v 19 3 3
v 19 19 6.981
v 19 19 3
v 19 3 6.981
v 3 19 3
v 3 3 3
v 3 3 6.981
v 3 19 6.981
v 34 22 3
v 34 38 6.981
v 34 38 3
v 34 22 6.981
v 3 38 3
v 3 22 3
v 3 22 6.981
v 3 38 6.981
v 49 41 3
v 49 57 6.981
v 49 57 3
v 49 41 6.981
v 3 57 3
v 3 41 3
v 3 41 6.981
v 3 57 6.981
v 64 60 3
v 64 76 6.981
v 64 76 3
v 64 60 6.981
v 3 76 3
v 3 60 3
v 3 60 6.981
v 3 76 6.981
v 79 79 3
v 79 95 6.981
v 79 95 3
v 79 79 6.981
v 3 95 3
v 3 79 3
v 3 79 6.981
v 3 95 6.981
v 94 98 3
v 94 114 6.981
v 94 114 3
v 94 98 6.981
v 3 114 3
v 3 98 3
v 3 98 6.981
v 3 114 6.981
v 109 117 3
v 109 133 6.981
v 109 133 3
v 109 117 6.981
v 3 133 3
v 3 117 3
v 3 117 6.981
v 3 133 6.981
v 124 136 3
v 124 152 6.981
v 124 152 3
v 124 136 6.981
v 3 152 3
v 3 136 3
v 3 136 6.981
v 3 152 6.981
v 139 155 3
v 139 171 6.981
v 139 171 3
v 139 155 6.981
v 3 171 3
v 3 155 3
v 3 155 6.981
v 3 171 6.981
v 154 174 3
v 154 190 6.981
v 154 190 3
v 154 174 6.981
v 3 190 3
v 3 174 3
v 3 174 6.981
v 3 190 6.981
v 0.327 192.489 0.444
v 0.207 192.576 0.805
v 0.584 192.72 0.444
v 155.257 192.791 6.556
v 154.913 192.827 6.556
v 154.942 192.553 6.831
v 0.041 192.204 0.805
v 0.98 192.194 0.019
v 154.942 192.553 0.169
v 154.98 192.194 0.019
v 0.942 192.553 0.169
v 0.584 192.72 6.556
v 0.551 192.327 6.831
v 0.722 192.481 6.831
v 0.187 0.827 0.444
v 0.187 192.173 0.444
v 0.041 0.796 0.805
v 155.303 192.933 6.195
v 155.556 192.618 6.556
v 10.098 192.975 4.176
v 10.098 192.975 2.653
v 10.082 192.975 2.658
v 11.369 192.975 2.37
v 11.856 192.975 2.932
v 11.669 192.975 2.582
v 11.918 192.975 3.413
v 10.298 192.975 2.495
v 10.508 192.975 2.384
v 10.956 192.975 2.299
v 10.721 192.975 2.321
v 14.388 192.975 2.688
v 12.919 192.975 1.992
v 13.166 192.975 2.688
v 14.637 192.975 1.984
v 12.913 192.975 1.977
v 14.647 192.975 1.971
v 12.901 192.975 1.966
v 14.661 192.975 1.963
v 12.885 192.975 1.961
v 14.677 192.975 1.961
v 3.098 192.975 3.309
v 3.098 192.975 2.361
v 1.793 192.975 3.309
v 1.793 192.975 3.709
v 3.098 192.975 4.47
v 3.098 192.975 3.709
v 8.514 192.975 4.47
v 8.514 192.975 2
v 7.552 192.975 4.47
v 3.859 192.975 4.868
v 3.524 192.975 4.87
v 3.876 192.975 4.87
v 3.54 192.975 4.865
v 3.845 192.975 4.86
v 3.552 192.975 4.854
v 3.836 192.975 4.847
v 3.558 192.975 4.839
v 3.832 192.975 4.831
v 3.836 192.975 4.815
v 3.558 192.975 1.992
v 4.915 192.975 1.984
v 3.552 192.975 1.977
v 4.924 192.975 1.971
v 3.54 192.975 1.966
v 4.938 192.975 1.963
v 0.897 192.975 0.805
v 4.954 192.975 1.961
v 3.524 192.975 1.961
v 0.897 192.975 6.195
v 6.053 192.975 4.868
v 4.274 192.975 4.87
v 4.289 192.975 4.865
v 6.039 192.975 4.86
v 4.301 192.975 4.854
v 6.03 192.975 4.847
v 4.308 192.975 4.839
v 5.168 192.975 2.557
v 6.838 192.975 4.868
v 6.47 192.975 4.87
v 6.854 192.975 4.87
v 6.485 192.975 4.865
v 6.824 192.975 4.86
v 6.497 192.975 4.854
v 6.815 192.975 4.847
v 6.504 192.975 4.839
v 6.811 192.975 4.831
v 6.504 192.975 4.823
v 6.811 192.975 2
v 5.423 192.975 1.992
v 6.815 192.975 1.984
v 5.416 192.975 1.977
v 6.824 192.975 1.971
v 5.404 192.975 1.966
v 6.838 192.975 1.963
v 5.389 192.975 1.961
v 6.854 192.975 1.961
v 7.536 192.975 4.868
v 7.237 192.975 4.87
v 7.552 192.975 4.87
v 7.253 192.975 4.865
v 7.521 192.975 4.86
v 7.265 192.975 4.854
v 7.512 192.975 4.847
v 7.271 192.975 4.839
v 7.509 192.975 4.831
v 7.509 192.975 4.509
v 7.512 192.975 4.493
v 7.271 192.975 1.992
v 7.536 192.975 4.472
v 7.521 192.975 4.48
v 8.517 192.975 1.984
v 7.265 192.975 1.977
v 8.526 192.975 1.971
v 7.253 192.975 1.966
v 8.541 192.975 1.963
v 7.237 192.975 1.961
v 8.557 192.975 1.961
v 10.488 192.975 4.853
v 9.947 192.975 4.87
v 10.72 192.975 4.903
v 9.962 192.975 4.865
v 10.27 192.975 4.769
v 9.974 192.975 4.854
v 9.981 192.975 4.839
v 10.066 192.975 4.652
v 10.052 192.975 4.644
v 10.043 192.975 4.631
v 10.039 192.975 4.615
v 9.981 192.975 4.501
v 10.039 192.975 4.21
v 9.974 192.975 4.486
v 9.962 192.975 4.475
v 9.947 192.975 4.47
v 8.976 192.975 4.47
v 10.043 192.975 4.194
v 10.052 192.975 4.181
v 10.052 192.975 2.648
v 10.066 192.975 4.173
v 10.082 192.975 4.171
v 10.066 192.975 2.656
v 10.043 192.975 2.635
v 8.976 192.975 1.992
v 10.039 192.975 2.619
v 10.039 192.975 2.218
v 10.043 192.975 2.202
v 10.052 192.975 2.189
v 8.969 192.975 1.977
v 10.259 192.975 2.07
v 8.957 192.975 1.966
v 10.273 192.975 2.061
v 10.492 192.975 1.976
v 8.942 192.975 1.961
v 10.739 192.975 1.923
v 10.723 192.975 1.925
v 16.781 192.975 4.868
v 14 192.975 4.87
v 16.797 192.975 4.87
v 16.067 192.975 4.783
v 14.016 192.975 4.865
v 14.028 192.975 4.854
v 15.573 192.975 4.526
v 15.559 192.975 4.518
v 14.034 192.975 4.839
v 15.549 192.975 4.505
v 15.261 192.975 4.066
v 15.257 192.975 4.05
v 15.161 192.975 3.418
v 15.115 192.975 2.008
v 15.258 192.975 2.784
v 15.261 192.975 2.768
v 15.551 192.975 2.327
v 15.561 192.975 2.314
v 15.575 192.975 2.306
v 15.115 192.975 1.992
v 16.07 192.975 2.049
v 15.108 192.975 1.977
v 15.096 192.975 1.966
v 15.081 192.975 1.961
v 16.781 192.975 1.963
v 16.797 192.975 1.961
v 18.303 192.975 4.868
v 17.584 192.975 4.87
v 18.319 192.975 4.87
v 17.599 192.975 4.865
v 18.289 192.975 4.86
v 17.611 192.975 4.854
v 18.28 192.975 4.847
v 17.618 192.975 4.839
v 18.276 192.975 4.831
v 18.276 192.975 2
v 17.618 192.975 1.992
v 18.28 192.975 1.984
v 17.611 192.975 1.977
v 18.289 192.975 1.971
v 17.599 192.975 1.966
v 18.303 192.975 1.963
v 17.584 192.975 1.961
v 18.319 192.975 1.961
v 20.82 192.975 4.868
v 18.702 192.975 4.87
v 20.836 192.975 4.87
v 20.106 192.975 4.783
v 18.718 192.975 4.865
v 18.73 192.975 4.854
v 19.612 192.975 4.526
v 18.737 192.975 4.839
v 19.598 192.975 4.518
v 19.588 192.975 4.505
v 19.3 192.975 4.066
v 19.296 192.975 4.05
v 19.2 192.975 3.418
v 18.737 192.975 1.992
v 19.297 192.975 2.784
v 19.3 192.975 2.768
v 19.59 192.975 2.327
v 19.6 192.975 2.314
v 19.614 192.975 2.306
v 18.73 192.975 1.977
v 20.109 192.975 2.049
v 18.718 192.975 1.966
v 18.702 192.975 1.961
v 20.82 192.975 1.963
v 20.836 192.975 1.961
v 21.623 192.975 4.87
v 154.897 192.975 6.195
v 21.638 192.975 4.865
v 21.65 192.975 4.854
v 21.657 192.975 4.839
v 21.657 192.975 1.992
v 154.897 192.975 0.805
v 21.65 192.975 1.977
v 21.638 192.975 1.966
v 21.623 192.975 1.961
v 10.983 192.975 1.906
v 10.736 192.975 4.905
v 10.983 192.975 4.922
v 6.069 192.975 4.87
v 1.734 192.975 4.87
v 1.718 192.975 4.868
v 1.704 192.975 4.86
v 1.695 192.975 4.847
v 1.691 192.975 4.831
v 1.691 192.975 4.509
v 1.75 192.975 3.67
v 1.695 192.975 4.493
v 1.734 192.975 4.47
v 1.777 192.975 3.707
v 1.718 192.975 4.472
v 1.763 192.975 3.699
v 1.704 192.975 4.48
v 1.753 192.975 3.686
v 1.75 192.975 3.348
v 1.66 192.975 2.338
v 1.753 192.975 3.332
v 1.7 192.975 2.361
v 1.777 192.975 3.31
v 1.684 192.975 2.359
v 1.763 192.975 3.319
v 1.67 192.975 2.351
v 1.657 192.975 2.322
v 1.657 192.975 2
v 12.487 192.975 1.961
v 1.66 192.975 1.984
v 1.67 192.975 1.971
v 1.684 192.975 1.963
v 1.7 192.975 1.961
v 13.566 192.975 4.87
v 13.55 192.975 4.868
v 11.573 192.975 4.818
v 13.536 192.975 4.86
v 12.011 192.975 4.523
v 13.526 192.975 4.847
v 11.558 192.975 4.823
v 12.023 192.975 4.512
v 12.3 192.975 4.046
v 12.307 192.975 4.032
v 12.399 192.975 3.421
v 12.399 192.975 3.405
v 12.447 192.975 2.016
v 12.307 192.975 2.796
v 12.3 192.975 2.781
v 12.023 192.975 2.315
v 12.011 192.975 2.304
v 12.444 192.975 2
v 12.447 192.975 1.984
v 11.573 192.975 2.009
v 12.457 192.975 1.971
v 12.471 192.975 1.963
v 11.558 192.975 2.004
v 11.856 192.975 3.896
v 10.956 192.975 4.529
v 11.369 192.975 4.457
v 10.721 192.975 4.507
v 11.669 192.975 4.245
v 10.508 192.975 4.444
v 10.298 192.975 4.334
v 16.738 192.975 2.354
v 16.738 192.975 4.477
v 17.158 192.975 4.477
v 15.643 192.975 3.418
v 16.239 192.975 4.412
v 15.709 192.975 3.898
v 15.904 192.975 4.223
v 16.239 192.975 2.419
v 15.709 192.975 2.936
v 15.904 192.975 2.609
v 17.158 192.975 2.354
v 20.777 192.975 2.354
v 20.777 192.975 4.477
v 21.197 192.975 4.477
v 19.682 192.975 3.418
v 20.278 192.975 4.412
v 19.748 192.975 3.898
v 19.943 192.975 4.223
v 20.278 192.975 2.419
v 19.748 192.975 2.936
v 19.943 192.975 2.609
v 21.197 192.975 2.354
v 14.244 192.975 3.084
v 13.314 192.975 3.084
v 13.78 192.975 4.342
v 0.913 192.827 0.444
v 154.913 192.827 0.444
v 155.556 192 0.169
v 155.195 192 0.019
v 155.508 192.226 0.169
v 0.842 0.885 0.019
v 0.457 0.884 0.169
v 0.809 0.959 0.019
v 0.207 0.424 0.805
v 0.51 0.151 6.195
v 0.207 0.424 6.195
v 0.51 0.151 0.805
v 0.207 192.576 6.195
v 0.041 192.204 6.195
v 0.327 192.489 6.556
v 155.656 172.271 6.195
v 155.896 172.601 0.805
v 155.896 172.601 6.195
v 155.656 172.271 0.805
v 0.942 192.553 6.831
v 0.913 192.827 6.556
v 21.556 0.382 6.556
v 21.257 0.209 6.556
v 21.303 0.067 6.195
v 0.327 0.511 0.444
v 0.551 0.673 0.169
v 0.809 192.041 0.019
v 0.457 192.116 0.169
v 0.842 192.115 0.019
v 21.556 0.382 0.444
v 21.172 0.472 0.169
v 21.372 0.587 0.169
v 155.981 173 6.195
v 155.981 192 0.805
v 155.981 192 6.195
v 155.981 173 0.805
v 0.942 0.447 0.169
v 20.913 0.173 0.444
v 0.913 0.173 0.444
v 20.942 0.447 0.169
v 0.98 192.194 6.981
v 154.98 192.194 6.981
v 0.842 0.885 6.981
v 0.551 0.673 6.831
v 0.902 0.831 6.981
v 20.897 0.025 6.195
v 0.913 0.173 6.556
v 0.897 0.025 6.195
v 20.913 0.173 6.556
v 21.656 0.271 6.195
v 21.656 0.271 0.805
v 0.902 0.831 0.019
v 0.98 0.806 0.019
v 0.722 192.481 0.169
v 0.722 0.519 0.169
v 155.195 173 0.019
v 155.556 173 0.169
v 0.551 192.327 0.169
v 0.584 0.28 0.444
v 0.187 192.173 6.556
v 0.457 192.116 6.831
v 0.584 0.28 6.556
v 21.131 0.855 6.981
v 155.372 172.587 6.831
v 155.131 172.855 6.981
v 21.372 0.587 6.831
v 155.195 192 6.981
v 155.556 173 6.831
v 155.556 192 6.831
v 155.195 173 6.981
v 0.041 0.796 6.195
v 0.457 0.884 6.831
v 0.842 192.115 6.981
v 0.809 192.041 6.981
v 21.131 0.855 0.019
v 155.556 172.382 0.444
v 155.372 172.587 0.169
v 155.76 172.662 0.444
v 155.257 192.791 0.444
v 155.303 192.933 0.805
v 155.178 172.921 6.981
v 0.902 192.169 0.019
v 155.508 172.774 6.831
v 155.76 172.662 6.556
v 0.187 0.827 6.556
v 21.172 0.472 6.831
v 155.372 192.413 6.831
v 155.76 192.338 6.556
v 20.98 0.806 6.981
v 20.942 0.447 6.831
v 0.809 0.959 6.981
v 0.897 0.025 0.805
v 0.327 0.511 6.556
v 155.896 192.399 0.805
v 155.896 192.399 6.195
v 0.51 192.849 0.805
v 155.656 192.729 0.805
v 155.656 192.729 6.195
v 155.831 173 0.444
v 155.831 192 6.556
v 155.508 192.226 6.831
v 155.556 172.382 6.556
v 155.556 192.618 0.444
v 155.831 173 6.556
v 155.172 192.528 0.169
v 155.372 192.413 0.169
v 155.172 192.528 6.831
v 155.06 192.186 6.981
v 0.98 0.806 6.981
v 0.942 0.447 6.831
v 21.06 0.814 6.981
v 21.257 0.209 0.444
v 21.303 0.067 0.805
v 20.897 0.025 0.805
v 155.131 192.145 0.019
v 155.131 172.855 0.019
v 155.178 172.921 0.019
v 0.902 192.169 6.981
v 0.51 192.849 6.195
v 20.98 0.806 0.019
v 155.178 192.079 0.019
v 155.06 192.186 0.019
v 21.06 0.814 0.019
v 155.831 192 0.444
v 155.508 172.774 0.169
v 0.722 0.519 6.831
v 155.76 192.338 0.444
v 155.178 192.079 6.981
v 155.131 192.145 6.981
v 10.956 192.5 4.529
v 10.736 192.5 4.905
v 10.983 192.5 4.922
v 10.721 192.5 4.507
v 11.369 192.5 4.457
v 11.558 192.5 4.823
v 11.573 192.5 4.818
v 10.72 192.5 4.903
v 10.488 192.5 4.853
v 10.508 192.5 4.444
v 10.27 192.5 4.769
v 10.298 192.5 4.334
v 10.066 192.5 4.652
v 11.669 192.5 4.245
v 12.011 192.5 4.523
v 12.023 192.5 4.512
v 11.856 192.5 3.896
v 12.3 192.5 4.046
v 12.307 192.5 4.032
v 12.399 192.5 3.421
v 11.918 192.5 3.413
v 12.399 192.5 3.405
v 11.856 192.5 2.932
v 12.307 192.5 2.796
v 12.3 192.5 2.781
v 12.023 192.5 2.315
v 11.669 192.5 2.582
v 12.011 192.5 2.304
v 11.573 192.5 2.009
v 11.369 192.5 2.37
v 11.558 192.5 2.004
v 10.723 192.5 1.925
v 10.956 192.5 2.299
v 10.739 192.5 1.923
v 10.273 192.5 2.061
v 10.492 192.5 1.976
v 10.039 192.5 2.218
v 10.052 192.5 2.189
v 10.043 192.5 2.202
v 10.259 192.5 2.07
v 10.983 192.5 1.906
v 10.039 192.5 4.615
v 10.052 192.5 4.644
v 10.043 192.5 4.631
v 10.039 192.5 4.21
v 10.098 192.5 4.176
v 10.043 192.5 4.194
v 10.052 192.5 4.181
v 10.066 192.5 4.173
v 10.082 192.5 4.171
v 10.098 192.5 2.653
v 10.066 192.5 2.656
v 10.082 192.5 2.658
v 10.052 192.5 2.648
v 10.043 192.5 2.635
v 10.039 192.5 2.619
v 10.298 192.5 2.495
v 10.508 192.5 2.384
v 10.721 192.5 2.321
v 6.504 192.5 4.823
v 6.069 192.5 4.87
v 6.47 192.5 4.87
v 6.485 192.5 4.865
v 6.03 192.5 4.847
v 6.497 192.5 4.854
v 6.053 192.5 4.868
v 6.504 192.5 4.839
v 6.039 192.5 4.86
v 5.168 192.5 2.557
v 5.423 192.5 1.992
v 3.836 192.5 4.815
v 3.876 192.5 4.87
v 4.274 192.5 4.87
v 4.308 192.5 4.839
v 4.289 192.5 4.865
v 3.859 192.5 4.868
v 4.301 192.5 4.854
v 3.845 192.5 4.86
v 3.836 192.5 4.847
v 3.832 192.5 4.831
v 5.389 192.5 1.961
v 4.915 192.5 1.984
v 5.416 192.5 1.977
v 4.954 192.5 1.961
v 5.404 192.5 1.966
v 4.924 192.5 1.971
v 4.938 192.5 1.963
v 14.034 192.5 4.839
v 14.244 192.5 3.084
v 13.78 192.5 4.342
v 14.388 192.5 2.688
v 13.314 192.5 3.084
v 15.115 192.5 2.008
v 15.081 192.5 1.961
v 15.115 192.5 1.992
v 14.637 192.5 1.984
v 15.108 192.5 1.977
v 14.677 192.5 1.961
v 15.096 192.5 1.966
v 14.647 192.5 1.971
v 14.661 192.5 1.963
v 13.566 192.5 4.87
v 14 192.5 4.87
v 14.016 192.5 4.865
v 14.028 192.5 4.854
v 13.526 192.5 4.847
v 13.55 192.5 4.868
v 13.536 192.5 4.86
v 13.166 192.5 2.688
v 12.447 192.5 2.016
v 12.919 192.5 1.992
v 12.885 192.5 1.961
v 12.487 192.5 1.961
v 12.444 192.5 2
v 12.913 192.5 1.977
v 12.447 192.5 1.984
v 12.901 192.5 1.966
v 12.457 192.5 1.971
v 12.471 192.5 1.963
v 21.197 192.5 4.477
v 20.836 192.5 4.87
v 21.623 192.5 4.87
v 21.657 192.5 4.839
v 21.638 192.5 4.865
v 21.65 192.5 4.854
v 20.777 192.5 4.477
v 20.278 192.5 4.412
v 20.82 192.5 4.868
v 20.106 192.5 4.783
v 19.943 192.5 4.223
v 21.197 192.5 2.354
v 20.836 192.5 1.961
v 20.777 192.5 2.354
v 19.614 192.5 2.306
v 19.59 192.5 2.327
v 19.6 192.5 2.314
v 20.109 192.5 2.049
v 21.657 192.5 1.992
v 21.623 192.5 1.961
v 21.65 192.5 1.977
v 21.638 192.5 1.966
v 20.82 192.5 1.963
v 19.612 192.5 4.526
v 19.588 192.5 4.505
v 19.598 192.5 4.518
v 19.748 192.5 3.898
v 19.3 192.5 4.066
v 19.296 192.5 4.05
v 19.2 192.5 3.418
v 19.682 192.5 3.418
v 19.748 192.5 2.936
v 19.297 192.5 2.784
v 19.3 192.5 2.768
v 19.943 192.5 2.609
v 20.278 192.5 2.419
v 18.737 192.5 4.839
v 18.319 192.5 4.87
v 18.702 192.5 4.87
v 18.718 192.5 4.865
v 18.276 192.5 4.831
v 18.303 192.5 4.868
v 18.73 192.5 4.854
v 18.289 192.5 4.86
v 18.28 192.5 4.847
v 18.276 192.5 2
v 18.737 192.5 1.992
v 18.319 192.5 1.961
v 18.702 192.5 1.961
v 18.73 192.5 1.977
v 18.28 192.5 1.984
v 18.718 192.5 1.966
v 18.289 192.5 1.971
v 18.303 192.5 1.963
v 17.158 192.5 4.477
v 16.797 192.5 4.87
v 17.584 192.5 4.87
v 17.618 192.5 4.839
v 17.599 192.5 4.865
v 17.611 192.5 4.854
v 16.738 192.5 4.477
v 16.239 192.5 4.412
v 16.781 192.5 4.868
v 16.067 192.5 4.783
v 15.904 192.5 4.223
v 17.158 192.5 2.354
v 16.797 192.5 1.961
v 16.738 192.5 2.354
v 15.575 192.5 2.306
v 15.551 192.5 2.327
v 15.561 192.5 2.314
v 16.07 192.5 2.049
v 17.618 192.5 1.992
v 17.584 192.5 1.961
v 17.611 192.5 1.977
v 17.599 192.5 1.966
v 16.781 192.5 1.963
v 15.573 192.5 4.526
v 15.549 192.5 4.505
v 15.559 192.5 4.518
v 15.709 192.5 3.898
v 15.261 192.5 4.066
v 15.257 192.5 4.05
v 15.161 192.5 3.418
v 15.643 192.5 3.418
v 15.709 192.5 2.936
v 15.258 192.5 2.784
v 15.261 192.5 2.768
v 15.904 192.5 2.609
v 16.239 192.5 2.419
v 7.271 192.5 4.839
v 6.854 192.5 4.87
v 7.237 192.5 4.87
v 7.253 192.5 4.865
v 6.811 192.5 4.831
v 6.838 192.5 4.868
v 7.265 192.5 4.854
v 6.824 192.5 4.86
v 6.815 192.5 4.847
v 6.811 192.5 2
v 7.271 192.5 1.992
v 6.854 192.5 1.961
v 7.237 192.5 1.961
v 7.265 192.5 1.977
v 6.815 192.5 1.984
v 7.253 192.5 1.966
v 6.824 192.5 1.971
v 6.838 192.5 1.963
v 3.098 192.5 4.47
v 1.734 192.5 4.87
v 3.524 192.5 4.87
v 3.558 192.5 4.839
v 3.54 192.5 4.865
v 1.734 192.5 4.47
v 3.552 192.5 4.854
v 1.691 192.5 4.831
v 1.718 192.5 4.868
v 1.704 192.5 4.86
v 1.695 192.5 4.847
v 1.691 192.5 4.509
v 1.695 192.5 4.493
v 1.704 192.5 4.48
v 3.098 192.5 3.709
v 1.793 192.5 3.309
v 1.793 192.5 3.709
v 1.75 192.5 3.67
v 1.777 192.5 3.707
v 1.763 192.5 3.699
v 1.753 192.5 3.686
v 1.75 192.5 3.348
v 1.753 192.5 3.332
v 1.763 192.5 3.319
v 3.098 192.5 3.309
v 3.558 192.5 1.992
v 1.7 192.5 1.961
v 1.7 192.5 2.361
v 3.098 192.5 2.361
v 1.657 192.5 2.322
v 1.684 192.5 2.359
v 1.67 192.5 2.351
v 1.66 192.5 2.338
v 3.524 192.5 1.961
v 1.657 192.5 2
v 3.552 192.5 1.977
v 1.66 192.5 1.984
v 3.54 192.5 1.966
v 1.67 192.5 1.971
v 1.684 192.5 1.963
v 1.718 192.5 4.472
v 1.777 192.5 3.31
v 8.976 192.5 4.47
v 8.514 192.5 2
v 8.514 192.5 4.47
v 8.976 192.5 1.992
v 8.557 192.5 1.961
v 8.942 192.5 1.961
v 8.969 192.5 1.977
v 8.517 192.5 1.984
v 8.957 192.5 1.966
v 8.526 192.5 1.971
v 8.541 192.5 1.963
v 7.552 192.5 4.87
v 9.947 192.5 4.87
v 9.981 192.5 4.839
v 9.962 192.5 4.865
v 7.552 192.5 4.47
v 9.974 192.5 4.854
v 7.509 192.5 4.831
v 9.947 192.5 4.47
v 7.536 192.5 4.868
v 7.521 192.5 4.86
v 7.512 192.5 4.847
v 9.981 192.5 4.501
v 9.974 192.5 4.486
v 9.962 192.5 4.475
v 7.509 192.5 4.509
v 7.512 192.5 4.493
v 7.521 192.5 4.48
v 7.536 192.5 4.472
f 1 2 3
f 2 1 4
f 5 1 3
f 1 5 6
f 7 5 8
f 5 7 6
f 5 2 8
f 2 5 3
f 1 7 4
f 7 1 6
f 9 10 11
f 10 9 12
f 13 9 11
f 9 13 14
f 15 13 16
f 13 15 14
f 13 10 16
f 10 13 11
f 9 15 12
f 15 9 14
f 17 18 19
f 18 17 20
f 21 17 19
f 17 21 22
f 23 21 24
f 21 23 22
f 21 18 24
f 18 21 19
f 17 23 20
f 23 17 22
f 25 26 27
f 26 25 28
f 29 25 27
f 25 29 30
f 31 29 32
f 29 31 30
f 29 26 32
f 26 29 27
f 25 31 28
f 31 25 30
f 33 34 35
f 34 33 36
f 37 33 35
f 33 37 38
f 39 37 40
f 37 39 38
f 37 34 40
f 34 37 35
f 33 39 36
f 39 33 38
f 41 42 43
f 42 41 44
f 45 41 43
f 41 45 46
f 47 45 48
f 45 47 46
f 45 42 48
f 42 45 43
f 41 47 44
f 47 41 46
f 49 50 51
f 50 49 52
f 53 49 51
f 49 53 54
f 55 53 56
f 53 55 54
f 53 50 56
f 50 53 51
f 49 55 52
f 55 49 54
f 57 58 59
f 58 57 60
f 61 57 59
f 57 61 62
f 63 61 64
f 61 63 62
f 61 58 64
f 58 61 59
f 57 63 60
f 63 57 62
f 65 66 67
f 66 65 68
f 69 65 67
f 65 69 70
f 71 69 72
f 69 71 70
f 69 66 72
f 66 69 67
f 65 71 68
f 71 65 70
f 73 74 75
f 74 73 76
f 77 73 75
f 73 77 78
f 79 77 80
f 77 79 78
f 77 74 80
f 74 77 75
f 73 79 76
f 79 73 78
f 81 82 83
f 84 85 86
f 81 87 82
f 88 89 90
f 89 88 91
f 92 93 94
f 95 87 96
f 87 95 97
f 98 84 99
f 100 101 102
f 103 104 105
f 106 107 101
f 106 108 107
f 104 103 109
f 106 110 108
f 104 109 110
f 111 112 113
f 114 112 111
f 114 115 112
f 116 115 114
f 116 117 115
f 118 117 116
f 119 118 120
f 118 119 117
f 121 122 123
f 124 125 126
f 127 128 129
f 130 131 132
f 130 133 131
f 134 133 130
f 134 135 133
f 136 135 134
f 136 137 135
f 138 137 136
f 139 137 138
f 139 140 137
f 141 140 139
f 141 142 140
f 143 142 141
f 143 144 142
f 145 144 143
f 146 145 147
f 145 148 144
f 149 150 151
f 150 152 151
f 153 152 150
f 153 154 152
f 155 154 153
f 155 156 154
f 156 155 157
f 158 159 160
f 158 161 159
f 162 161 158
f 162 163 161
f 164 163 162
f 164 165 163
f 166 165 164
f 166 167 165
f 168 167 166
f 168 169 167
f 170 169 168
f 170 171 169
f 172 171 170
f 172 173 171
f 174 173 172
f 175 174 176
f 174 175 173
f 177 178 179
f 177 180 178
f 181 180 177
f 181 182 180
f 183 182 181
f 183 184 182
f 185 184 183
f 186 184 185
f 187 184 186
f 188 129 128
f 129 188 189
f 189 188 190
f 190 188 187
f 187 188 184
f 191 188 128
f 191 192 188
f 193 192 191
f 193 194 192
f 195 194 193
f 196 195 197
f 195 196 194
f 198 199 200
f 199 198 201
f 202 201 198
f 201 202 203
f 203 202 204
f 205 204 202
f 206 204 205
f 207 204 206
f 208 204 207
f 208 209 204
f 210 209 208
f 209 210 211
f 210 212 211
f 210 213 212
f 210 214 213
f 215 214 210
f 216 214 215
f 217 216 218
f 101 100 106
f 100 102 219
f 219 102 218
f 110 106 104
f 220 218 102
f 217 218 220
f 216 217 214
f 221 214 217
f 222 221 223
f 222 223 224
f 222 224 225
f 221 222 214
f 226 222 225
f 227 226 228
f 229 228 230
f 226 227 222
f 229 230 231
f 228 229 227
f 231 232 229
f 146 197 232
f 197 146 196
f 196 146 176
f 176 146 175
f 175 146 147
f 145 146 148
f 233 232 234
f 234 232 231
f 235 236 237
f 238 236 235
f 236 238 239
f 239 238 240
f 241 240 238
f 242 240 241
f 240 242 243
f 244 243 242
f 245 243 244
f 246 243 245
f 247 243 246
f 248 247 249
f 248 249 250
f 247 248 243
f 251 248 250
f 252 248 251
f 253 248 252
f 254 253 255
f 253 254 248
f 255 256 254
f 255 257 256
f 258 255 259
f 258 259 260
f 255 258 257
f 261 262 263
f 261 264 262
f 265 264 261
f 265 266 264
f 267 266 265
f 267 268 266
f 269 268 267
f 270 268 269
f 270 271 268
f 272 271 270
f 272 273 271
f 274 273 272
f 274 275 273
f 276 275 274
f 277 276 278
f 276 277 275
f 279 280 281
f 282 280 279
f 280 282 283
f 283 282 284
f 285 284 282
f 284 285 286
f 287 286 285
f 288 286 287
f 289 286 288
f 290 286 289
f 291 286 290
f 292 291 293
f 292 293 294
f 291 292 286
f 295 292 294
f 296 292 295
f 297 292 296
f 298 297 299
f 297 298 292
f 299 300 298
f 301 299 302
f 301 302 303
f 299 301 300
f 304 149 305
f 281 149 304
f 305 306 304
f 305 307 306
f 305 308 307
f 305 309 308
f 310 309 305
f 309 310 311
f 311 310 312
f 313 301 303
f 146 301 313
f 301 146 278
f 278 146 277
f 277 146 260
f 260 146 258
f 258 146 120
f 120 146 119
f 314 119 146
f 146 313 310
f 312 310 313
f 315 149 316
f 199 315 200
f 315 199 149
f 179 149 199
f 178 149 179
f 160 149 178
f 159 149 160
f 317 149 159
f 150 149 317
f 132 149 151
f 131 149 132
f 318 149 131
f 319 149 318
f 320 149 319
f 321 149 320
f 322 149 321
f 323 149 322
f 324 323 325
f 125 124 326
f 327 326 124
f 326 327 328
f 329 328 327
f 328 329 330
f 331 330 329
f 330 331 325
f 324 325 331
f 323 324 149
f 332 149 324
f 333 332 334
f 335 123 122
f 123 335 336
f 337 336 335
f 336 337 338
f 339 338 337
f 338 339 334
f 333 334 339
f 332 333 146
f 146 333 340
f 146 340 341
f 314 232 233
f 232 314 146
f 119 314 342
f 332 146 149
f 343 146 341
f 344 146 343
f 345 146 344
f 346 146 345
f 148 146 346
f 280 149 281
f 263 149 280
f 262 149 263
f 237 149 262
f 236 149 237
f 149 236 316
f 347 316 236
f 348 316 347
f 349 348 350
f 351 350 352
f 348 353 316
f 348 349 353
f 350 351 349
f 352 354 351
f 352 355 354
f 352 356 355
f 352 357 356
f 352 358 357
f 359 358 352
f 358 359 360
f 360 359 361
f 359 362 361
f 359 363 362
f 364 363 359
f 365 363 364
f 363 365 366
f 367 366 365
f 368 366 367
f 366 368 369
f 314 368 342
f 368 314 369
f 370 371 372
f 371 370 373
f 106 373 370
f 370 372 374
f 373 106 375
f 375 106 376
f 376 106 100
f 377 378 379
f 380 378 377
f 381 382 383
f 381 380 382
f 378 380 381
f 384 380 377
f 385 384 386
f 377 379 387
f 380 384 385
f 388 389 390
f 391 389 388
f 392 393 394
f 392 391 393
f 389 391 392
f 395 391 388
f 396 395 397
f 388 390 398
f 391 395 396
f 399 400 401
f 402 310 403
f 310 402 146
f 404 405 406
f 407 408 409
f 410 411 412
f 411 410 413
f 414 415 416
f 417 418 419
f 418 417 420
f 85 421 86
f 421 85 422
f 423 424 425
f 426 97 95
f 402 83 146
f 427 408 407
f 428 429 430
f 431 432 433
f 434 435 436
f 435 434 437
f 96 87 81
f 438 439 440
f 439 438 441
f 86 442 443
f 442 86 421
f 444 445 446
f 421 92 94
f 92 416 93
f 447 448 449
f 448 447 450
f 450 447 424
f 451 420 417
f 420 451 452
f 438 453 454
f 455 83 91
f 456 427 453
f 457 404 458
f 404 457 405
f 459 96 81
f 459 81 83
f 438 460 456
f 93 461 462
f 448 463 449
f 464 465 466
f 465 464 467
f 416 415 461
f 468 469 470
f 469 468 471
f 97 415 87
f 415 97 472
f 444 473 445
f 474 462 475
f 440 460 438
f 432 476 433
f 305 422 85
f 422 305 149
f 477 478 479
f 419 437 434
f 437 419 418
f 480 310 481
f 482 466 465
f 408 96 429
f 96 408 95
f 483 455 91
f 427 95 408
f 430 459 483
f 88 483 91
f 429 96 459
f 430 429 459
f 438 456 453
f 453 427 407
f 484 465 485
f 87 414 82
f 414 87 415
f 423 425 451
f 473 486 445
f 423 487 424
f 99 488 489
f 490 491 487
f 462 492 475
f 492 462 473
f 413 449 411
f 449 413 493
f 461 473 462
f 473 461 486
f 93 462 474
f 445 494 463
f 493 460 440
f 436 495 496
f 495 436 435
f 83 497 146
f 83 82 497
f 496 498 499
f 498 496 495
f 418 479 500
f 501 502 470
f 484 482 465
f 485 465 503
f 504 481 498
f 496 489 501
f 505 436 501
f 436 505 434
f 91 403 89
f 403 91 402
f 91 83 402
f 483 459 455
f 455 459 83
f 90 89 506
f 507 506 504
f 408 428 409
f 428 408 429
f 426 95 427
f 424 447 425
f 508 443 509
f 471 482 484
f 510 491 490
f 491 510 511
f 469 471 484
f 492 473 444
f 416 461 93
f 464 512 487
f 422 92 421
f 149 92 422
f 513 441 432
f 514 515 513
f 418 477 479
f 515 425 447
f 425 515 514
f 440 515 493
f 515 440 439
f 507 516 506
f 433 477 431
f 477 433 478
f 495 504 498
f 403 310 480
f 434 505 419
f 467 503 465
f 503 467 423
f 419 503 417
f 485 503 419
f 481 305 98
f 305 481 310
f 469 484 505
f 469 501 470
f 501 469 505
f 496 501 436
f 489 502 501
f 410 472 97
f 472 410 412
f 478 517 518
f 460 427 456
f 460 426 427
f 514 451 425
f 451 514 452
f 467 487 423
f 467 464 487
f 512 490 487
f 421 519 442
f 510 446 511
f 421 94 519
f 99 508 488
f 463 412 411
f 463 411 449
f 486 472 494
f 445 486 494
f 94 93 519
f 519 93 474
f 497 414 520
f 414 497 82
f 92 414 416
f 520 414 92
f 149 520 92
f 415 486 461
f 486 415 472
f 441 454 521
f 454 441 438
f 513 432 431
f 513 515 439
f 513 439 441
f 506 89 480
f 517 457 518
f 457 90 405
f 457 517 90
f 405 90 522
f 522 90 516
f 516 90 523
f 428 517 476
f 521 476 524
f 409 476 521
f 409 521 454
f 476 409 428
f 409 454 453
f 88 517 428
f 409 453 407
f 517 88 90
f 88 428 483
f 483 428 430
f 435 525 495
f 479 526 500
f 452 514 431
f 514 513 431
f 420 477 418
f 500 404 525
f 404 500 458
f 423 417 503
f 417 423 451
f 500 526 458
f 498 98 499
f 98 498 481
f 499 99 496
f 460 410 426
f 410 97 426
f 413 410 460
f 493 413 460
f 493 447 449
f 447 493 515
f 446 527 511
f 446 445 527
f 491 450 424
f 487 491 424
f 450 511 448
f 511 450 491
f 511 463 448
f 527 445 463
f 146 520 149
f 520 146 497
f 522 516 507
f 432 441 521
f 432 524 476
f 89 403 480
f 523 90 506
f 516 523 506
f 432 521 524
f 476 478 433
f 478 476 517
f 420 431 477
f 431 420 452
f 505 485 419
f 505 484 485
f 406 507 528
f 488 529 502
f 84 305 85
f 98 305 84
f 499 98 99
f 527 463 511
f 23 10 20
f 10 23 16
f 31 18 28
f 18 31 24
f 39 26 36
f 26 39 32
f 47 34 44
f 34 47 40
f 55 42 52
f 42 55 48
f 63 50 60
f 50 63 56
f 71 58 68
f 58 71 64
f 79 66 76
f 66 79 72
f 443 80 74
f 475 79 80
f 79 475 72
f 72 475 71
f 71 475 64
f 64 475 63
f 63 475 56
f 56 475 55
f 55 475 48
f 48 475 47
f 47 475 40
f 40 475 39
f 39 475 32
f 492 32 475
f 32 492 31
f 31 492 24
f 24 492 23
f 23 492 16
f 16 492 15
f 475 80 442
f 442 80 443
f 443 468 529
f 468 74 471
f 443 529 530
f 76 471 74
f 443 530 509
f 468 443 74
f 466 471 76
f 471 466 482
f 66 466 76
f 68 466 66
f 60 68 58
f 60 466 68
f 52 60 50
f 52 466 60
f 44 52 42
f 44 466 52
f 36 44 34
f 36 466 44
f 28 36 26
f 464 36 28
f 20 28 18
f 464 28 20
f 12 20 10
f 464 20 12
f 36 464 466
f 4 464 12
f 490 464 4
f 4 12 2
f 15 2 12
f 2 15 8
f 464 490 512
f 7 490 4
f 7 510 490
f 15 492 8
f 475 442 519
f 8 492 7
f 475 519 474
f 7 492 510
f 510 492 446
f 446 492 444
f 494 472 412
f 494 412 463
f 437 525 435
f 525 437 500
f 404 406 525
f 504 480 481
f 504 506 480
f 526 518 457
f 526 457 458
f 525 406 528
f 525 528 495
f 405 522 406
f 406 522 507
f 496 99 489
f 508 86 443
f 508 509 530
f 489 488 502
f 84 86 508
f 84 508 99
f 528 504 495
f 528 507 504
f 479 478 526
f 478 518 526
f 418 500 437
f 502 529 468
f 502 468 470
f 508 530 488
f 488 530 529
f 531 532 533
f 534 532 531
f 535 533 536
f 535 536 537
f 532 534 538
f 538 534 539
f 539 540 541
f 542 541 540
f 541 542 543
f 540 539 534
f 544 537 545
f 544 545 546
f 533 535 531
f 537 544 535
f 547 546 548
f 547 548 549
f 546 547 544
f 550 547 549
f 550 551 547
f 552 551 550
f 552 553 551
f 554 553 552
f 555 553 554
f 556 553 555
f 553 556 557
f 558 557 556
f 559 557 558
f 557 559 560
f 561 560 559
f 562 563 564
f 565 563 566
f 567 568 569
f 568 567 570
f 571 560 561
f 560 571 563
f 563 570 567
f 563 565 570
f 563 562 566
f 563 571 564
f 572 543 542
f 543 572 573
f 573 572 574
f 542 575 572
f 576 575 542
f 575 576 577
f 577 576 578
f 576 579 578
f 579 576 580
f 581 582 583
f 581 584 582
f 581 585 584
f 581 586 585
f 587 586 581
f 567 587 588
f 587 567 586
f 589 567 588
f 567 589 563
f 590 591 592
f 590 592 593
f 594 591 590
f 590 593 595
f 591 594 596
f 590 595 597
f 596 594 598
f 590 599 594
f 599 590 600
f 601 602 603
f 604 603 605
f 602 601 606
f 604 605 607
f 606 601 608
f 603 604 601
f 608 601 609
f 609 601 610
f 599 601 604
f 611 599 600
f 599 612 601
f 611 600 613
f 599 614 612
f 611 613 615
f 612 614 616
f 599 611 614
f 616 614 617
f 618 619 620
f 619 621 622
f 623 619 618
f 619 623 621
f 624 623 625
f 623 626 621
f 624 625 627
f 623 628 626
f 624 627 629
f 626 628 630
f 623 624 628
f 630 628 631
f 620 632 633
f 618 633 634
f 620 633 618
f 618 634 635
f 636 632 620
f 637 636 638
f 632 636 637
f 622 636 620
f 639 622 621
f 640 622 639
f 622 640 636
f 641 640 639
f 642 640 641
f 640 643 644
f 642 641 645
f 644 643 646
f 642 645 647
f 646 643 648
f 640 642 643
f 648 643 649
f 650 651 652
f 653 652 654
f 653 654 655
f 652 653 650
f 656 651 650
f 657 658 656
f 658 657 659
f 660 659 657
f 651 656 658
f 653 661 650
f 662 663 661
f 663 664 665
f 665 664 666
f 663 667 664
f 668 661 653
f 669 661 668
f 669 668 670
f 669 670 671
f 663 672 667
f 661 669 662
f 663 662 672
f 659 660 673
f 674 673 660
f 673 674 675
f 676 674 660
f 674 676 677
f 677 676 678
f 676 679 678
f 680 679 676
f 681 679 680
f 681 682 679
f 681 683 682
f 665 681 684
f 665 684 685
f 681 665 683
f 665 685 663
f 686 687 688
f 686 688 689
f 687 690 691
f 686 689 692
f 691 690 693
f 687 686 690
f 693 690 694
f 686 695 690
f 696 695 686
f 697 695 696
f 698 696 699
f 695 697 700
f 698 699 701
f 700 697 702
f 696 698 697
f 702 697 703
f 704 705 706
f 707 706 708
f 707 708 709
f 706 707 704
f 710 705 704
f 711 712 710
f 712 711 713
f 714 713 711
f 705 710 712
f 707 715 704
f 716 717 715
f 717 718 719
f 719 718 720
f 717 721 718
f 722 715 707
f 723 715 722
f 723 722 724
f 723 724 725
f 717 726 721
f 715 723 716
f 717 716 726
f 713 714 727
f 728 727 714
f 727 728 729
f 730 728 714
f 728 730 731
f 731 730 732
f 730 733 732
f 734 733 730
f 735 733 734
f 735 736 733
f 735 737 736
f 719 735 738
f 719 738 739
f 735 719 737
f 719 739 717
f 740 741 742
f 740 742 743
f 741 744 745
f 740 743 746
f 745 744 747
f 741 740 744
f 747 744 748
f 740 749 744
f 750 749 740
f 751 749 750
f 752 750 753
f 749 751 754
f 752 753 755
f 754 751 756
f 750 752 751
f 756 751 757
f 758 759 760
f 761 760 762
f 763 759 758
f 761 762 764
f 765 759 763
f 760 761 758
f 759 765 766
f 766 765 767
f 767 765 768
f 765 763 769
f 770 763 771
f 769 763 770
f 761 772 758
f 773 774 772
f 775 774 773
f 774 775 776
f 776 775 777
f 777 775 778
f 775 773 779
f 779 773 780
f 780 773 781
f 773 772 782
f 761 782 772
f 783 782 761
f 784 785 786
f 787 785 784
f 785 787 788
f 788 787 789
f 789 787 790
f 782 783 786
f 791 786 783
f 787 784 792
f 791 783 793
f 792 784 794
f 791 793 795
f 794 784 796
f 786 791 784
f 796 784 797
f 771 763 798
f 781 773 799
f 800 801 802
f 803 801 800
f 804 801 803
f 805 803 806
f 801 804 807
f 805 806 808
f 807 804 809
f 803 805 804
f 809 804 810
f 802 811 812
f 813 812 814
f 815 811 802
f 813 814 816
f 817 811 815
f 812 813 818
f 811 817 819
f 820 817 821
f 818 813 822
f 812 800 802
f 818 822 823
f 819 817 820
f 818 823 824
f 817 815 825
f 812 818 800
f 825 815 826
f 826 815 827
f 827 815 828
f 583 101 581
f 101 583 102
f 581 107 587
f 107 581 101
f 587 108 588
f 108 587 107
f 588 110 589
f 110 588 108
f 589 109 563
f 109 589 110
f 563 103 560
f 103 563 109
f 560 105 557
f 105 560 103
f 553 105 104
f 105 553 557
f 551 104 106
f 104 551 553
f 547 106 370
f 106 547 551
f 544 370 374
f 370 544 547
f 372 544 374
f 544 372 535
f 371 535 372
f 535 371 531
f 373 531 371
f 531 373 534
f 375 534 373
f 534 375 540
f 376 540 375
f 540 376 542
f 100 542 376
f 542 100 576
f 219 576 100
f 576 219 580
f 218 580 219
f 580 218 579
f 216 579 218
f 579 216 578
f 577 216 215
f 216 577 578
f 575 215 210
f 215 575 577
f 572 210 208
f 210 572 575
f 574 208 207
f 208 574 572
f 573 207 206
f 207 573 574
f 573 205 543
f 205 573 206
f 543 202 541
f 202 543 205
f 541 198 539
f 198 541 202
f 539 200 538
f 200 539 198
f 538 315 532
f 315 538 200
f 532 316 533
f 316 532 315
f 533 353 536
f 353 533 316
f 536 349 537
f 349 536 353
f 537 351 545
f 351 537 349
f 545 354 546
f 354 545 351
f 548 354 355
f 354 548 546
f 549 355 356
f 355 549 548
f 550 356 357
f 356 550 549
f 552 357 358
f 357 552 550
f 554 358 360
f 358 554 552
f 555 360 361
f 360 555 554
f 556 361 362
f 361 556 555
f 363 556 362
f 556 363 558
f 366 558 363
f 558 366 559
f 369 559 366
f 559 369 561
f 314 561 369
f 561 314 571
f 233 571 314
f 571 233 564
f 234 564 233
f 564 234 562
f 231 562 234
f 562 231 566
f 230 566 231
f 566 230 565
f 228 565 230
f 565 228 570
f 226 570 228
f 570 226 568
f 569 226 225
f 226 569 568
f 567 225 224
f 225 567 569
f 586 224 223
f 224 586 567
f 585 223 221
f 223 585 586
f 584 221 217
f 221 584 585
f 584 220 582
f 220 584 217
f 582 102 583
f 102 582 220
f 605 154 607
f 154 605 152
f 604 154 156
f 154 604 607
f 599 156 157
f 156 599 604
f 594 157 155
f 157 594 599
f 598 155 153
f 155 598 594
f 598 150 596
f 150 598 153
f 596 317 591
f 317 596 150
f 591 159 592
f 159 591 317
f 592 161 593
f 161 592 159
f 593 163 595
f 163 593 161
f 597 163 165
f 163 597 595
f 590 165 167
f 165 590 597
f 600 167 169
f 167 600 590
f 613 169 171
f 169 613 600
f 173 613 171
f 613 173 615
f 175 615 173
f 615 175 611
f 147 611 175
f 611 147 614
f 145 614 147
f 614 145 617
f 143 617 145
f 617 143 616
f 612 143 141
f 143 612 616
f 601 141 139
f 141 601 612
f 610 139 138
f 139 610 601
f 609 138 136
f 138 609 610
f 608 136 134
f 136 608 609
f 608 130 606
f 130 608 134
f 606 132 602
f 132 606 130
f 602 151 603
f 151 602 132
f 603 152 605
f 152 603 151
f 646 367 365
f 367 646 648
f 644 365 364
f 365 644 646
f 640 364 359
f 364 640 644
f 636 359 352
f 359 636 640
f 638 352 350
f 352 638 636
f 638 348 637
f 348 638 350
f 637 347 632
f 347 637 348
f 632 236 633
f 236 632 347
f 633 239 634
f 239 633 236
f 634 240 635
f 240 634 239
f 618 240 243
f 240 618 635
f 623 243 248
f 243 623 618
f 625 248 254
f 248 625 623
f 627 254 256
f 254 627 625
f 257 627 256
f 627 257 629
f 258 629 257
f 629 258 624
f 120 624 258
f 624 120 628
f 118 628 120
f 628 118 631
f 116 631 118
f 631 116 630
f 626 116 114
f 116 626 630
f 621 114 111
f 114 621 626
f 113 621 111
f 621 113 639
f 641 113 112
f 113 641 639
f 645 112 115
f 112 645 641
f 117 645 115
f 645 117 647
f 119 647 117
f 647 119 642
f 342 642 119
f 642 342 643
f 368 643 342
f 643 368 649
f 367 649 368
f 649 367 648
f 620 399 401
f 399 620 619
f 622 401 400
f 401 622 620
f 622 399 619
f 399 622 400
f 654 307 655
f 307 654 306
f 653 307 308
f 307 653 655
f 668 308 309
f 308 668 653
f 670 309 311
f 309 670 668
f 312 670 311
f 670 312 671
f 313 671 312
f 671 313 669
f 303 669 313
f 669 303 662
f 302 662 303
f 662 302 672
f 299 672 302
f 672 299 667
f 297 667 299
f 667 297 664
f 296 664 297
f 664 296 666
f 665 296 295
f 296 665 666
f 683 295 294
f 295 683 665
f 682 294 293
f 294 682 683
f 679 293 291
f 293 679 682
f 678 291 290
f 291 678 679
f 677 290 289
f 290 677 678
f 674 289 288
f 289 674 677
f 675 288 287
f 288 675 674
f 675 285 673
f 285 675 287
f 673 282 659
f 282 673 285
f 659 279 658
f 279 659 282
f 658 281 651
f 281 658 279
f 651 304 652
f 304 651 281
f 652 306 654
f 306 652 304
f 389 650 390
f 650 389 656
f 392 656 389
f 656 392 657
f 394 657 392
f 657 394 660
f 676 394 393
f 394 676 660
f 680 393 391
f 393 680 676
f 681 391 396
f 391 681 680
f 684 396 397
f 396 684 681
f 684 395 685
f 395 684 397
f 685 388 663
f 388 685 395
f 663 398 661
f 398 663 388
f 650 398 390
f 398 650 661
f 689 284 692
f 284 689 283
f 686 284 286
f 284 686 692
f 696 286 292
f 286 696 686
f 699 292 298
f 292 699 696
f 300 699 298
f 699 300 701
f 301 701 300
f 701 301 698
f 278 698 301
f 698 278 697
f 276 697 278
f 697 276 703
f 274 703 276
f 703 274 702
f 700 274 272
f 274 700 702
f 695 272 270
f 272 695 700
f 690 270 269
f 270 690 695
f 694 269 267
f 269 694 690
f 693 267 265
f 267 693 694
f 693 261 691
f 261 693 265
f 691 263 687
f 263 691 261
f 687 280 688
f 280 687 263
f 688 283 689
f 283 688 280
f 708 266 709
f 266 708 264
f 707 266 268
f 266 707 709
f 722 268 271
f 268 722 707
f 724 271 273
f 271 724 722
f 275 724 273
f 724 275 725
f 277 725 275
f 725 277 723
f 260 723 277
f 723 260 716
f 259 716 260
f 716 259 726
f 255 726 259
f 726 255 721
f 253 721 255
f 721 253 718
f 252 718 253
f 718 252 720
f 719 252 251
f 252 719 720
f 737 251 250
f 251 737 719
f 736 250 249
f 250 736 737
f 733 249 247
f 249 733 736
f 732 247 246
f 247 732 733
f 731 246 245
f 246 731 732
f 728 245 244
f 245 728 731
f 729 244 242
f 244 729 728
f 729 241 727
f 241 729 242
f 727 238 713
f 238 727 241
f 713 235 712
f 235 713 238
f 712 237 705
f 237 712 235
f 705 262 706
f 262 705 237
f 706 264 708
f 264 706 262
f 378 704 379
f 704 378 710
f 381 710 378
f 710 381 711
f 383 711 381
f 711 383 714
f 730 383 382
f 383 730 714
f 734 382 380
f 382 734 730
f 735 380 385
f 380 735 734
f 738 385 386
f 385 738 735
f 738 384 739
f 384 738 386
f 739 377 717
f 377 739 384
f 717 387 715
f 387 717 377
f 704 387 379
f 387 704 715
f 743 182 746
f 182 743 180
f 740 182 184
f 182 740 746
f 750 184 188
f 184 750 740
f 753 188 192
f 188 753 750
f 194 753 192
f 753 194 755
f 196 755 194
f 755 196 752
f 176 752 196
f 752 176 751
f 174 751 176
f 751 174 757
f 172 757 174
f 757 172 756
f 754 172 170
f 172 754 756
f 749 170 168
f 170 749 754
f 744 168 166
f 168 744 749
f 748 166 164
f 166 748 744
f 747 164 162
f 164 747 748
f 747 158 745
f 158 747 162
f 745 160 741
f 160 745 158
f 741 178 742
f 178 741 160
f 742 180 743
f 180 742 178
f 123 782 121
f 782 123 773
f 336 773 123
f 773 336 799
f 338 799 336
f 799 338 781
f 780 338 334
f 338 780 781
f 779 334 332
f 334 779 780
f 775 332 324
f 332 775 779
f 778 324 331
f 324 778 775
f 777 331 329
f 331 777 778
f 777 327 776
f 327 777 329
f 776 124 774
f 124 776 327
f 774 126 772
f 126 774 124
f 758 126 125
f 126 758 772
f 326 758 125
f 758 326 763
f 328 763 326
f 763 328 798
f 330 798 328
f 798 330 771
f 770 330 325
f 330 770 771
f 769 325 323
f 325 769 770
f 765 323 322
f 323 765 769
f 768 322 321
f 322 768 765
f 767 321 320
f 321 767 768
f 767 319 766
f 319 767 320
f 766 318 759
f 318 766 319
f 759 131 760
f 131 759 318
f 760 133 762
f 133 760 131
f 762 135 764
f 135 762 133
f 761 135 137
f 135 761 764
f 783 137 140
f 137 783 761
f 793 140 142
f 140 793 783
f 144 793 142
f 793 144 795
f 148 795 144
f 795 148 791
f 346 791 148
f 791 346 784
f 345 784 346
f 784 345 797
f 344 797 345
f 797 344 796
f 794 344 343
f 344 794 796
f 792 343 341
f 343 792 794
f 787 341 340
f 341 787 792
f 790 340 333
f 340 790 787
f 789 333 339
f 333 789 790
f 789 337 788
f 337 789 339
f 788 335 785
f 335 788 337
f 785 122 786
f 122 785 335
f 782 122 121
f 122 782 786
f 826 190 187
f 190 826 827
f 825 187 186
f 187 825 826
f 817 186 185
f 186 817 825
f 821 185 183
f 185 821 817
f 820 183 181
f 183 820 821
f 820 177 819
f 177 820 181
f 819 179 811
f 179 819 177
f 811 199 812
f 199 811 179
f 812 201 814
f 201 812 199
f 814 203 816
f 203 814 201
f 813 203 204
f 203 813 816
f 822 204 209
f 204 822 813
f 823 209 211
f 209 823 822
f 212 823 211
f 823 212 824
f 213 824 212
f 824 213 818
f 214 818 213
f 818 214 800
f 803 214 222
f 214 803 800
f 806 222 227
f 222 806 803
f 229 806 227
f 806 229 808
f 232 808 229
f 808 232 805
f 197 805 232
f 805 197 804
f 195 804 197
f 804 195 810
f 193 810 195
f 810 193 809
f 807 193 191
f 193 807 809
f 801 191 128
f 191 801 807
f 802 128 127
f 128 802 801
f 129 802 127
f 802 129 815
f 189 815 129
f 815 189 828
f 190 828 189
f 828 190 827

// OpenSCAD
// file: logo.scad
module logo() {
	translate([-7, 68, 0]) logoText();
	logoShapes();
}

module logoText() {
	linear_extrude(height = 10) {
		minkowski() {
			text("DIDACTIVE", size=71.7, font="Century Gothic");
			circle(1);
		}
	}
}

module logoShapes() {
	step = 63;
	linear_extrude(height = 10) {
		translate([0*step, 0]) logoSquare();
		translate([1*step, 0]) logoCircle();
		translate([2*step, 0]) logoTriangle();
		translate([3*step, 0]) logoCircle();
		translate([4*step, 0]) logoSquare();
		translate([5*step, 0]) logoCircle();
		translate([6*step, 0]) logoTriangle();
		translate([7*step, 0]) logoCircle();
	}
}

module logoSquare() {
	difference() {
		square(52);
		translate([12, 12]) square(28);
	}
}

module logoCircle() {
	difference() {
		square(52);
		translate([26, 26]) circle(d=35);
	}
}

module logoTriangle() {
	a = 20;
	points = [[0, a], [-cos(30)*a, -sin(30)*a], [cos(30)*a, -sin(30)*a]];
	difference() {
		square(52);
		translate([26, 22]) polygon(points);
	}
}
// main file
$fn = 15;
include<logo.scad>

a = 15; // jednotková vzdálenost
numCubes = 10; // počet jednotek

border = 3; // prostor kolem hranolku, respektive vzdálenost mezi nimi
boardHeight = 7; // plná tloušťka destičky
indentDepth = 5; // hloubka díry pro hranolek
extraSpace = 0.5; // rezerva

roundness = 1; // zaoblení
logoDepth = 0.5; // hloubka loga
logoSize = 20; // velikost loga

chunkSize = a + border + 2*extraSpace;
boardSize = numCubes * chunkSize + border;

module base() {
	translate([roundness, roundness, 0]) sphere(roundness);
	translate([chunkSize + border - roundness, roundness, 0]) sphere(roundness);
	translate([10*a + 2*border - roundness, boardSize - chunkSize - roundness, 0]) sphere(roundness);
	translate([10*a + 2*border - roundness, boardSize - roundness, 0]) sphere(roundness);
	translate([roundness, boardSize - roundness, 0]) sphere(roundness);
}

module chunk(size) {
	cube([a*size + 2*extraSpace, a + 2*extraSpace, indentDepth]);
}

module board() {
	difference() {
		hull() {
			translate([0, 0, roundness]) base();
			translate([0, 0, boardHeight - roundness]) base();	
		}
		// indents
		for (i = [1 : numCubes]) {
			translate([border, border + (i-1) * chunkSize, 3]) chunk(i);
		}
	}
}

difference() {
	board();
	// logo
	translate([logoSize + 2, boardSize - logoDepth, (boardHeight - 0.15*logoSize) / 2])
	rotate([90, 0, 180]) resize([logoSize, 0, 1.01*logoDepth], auto=true) logoText();
}
